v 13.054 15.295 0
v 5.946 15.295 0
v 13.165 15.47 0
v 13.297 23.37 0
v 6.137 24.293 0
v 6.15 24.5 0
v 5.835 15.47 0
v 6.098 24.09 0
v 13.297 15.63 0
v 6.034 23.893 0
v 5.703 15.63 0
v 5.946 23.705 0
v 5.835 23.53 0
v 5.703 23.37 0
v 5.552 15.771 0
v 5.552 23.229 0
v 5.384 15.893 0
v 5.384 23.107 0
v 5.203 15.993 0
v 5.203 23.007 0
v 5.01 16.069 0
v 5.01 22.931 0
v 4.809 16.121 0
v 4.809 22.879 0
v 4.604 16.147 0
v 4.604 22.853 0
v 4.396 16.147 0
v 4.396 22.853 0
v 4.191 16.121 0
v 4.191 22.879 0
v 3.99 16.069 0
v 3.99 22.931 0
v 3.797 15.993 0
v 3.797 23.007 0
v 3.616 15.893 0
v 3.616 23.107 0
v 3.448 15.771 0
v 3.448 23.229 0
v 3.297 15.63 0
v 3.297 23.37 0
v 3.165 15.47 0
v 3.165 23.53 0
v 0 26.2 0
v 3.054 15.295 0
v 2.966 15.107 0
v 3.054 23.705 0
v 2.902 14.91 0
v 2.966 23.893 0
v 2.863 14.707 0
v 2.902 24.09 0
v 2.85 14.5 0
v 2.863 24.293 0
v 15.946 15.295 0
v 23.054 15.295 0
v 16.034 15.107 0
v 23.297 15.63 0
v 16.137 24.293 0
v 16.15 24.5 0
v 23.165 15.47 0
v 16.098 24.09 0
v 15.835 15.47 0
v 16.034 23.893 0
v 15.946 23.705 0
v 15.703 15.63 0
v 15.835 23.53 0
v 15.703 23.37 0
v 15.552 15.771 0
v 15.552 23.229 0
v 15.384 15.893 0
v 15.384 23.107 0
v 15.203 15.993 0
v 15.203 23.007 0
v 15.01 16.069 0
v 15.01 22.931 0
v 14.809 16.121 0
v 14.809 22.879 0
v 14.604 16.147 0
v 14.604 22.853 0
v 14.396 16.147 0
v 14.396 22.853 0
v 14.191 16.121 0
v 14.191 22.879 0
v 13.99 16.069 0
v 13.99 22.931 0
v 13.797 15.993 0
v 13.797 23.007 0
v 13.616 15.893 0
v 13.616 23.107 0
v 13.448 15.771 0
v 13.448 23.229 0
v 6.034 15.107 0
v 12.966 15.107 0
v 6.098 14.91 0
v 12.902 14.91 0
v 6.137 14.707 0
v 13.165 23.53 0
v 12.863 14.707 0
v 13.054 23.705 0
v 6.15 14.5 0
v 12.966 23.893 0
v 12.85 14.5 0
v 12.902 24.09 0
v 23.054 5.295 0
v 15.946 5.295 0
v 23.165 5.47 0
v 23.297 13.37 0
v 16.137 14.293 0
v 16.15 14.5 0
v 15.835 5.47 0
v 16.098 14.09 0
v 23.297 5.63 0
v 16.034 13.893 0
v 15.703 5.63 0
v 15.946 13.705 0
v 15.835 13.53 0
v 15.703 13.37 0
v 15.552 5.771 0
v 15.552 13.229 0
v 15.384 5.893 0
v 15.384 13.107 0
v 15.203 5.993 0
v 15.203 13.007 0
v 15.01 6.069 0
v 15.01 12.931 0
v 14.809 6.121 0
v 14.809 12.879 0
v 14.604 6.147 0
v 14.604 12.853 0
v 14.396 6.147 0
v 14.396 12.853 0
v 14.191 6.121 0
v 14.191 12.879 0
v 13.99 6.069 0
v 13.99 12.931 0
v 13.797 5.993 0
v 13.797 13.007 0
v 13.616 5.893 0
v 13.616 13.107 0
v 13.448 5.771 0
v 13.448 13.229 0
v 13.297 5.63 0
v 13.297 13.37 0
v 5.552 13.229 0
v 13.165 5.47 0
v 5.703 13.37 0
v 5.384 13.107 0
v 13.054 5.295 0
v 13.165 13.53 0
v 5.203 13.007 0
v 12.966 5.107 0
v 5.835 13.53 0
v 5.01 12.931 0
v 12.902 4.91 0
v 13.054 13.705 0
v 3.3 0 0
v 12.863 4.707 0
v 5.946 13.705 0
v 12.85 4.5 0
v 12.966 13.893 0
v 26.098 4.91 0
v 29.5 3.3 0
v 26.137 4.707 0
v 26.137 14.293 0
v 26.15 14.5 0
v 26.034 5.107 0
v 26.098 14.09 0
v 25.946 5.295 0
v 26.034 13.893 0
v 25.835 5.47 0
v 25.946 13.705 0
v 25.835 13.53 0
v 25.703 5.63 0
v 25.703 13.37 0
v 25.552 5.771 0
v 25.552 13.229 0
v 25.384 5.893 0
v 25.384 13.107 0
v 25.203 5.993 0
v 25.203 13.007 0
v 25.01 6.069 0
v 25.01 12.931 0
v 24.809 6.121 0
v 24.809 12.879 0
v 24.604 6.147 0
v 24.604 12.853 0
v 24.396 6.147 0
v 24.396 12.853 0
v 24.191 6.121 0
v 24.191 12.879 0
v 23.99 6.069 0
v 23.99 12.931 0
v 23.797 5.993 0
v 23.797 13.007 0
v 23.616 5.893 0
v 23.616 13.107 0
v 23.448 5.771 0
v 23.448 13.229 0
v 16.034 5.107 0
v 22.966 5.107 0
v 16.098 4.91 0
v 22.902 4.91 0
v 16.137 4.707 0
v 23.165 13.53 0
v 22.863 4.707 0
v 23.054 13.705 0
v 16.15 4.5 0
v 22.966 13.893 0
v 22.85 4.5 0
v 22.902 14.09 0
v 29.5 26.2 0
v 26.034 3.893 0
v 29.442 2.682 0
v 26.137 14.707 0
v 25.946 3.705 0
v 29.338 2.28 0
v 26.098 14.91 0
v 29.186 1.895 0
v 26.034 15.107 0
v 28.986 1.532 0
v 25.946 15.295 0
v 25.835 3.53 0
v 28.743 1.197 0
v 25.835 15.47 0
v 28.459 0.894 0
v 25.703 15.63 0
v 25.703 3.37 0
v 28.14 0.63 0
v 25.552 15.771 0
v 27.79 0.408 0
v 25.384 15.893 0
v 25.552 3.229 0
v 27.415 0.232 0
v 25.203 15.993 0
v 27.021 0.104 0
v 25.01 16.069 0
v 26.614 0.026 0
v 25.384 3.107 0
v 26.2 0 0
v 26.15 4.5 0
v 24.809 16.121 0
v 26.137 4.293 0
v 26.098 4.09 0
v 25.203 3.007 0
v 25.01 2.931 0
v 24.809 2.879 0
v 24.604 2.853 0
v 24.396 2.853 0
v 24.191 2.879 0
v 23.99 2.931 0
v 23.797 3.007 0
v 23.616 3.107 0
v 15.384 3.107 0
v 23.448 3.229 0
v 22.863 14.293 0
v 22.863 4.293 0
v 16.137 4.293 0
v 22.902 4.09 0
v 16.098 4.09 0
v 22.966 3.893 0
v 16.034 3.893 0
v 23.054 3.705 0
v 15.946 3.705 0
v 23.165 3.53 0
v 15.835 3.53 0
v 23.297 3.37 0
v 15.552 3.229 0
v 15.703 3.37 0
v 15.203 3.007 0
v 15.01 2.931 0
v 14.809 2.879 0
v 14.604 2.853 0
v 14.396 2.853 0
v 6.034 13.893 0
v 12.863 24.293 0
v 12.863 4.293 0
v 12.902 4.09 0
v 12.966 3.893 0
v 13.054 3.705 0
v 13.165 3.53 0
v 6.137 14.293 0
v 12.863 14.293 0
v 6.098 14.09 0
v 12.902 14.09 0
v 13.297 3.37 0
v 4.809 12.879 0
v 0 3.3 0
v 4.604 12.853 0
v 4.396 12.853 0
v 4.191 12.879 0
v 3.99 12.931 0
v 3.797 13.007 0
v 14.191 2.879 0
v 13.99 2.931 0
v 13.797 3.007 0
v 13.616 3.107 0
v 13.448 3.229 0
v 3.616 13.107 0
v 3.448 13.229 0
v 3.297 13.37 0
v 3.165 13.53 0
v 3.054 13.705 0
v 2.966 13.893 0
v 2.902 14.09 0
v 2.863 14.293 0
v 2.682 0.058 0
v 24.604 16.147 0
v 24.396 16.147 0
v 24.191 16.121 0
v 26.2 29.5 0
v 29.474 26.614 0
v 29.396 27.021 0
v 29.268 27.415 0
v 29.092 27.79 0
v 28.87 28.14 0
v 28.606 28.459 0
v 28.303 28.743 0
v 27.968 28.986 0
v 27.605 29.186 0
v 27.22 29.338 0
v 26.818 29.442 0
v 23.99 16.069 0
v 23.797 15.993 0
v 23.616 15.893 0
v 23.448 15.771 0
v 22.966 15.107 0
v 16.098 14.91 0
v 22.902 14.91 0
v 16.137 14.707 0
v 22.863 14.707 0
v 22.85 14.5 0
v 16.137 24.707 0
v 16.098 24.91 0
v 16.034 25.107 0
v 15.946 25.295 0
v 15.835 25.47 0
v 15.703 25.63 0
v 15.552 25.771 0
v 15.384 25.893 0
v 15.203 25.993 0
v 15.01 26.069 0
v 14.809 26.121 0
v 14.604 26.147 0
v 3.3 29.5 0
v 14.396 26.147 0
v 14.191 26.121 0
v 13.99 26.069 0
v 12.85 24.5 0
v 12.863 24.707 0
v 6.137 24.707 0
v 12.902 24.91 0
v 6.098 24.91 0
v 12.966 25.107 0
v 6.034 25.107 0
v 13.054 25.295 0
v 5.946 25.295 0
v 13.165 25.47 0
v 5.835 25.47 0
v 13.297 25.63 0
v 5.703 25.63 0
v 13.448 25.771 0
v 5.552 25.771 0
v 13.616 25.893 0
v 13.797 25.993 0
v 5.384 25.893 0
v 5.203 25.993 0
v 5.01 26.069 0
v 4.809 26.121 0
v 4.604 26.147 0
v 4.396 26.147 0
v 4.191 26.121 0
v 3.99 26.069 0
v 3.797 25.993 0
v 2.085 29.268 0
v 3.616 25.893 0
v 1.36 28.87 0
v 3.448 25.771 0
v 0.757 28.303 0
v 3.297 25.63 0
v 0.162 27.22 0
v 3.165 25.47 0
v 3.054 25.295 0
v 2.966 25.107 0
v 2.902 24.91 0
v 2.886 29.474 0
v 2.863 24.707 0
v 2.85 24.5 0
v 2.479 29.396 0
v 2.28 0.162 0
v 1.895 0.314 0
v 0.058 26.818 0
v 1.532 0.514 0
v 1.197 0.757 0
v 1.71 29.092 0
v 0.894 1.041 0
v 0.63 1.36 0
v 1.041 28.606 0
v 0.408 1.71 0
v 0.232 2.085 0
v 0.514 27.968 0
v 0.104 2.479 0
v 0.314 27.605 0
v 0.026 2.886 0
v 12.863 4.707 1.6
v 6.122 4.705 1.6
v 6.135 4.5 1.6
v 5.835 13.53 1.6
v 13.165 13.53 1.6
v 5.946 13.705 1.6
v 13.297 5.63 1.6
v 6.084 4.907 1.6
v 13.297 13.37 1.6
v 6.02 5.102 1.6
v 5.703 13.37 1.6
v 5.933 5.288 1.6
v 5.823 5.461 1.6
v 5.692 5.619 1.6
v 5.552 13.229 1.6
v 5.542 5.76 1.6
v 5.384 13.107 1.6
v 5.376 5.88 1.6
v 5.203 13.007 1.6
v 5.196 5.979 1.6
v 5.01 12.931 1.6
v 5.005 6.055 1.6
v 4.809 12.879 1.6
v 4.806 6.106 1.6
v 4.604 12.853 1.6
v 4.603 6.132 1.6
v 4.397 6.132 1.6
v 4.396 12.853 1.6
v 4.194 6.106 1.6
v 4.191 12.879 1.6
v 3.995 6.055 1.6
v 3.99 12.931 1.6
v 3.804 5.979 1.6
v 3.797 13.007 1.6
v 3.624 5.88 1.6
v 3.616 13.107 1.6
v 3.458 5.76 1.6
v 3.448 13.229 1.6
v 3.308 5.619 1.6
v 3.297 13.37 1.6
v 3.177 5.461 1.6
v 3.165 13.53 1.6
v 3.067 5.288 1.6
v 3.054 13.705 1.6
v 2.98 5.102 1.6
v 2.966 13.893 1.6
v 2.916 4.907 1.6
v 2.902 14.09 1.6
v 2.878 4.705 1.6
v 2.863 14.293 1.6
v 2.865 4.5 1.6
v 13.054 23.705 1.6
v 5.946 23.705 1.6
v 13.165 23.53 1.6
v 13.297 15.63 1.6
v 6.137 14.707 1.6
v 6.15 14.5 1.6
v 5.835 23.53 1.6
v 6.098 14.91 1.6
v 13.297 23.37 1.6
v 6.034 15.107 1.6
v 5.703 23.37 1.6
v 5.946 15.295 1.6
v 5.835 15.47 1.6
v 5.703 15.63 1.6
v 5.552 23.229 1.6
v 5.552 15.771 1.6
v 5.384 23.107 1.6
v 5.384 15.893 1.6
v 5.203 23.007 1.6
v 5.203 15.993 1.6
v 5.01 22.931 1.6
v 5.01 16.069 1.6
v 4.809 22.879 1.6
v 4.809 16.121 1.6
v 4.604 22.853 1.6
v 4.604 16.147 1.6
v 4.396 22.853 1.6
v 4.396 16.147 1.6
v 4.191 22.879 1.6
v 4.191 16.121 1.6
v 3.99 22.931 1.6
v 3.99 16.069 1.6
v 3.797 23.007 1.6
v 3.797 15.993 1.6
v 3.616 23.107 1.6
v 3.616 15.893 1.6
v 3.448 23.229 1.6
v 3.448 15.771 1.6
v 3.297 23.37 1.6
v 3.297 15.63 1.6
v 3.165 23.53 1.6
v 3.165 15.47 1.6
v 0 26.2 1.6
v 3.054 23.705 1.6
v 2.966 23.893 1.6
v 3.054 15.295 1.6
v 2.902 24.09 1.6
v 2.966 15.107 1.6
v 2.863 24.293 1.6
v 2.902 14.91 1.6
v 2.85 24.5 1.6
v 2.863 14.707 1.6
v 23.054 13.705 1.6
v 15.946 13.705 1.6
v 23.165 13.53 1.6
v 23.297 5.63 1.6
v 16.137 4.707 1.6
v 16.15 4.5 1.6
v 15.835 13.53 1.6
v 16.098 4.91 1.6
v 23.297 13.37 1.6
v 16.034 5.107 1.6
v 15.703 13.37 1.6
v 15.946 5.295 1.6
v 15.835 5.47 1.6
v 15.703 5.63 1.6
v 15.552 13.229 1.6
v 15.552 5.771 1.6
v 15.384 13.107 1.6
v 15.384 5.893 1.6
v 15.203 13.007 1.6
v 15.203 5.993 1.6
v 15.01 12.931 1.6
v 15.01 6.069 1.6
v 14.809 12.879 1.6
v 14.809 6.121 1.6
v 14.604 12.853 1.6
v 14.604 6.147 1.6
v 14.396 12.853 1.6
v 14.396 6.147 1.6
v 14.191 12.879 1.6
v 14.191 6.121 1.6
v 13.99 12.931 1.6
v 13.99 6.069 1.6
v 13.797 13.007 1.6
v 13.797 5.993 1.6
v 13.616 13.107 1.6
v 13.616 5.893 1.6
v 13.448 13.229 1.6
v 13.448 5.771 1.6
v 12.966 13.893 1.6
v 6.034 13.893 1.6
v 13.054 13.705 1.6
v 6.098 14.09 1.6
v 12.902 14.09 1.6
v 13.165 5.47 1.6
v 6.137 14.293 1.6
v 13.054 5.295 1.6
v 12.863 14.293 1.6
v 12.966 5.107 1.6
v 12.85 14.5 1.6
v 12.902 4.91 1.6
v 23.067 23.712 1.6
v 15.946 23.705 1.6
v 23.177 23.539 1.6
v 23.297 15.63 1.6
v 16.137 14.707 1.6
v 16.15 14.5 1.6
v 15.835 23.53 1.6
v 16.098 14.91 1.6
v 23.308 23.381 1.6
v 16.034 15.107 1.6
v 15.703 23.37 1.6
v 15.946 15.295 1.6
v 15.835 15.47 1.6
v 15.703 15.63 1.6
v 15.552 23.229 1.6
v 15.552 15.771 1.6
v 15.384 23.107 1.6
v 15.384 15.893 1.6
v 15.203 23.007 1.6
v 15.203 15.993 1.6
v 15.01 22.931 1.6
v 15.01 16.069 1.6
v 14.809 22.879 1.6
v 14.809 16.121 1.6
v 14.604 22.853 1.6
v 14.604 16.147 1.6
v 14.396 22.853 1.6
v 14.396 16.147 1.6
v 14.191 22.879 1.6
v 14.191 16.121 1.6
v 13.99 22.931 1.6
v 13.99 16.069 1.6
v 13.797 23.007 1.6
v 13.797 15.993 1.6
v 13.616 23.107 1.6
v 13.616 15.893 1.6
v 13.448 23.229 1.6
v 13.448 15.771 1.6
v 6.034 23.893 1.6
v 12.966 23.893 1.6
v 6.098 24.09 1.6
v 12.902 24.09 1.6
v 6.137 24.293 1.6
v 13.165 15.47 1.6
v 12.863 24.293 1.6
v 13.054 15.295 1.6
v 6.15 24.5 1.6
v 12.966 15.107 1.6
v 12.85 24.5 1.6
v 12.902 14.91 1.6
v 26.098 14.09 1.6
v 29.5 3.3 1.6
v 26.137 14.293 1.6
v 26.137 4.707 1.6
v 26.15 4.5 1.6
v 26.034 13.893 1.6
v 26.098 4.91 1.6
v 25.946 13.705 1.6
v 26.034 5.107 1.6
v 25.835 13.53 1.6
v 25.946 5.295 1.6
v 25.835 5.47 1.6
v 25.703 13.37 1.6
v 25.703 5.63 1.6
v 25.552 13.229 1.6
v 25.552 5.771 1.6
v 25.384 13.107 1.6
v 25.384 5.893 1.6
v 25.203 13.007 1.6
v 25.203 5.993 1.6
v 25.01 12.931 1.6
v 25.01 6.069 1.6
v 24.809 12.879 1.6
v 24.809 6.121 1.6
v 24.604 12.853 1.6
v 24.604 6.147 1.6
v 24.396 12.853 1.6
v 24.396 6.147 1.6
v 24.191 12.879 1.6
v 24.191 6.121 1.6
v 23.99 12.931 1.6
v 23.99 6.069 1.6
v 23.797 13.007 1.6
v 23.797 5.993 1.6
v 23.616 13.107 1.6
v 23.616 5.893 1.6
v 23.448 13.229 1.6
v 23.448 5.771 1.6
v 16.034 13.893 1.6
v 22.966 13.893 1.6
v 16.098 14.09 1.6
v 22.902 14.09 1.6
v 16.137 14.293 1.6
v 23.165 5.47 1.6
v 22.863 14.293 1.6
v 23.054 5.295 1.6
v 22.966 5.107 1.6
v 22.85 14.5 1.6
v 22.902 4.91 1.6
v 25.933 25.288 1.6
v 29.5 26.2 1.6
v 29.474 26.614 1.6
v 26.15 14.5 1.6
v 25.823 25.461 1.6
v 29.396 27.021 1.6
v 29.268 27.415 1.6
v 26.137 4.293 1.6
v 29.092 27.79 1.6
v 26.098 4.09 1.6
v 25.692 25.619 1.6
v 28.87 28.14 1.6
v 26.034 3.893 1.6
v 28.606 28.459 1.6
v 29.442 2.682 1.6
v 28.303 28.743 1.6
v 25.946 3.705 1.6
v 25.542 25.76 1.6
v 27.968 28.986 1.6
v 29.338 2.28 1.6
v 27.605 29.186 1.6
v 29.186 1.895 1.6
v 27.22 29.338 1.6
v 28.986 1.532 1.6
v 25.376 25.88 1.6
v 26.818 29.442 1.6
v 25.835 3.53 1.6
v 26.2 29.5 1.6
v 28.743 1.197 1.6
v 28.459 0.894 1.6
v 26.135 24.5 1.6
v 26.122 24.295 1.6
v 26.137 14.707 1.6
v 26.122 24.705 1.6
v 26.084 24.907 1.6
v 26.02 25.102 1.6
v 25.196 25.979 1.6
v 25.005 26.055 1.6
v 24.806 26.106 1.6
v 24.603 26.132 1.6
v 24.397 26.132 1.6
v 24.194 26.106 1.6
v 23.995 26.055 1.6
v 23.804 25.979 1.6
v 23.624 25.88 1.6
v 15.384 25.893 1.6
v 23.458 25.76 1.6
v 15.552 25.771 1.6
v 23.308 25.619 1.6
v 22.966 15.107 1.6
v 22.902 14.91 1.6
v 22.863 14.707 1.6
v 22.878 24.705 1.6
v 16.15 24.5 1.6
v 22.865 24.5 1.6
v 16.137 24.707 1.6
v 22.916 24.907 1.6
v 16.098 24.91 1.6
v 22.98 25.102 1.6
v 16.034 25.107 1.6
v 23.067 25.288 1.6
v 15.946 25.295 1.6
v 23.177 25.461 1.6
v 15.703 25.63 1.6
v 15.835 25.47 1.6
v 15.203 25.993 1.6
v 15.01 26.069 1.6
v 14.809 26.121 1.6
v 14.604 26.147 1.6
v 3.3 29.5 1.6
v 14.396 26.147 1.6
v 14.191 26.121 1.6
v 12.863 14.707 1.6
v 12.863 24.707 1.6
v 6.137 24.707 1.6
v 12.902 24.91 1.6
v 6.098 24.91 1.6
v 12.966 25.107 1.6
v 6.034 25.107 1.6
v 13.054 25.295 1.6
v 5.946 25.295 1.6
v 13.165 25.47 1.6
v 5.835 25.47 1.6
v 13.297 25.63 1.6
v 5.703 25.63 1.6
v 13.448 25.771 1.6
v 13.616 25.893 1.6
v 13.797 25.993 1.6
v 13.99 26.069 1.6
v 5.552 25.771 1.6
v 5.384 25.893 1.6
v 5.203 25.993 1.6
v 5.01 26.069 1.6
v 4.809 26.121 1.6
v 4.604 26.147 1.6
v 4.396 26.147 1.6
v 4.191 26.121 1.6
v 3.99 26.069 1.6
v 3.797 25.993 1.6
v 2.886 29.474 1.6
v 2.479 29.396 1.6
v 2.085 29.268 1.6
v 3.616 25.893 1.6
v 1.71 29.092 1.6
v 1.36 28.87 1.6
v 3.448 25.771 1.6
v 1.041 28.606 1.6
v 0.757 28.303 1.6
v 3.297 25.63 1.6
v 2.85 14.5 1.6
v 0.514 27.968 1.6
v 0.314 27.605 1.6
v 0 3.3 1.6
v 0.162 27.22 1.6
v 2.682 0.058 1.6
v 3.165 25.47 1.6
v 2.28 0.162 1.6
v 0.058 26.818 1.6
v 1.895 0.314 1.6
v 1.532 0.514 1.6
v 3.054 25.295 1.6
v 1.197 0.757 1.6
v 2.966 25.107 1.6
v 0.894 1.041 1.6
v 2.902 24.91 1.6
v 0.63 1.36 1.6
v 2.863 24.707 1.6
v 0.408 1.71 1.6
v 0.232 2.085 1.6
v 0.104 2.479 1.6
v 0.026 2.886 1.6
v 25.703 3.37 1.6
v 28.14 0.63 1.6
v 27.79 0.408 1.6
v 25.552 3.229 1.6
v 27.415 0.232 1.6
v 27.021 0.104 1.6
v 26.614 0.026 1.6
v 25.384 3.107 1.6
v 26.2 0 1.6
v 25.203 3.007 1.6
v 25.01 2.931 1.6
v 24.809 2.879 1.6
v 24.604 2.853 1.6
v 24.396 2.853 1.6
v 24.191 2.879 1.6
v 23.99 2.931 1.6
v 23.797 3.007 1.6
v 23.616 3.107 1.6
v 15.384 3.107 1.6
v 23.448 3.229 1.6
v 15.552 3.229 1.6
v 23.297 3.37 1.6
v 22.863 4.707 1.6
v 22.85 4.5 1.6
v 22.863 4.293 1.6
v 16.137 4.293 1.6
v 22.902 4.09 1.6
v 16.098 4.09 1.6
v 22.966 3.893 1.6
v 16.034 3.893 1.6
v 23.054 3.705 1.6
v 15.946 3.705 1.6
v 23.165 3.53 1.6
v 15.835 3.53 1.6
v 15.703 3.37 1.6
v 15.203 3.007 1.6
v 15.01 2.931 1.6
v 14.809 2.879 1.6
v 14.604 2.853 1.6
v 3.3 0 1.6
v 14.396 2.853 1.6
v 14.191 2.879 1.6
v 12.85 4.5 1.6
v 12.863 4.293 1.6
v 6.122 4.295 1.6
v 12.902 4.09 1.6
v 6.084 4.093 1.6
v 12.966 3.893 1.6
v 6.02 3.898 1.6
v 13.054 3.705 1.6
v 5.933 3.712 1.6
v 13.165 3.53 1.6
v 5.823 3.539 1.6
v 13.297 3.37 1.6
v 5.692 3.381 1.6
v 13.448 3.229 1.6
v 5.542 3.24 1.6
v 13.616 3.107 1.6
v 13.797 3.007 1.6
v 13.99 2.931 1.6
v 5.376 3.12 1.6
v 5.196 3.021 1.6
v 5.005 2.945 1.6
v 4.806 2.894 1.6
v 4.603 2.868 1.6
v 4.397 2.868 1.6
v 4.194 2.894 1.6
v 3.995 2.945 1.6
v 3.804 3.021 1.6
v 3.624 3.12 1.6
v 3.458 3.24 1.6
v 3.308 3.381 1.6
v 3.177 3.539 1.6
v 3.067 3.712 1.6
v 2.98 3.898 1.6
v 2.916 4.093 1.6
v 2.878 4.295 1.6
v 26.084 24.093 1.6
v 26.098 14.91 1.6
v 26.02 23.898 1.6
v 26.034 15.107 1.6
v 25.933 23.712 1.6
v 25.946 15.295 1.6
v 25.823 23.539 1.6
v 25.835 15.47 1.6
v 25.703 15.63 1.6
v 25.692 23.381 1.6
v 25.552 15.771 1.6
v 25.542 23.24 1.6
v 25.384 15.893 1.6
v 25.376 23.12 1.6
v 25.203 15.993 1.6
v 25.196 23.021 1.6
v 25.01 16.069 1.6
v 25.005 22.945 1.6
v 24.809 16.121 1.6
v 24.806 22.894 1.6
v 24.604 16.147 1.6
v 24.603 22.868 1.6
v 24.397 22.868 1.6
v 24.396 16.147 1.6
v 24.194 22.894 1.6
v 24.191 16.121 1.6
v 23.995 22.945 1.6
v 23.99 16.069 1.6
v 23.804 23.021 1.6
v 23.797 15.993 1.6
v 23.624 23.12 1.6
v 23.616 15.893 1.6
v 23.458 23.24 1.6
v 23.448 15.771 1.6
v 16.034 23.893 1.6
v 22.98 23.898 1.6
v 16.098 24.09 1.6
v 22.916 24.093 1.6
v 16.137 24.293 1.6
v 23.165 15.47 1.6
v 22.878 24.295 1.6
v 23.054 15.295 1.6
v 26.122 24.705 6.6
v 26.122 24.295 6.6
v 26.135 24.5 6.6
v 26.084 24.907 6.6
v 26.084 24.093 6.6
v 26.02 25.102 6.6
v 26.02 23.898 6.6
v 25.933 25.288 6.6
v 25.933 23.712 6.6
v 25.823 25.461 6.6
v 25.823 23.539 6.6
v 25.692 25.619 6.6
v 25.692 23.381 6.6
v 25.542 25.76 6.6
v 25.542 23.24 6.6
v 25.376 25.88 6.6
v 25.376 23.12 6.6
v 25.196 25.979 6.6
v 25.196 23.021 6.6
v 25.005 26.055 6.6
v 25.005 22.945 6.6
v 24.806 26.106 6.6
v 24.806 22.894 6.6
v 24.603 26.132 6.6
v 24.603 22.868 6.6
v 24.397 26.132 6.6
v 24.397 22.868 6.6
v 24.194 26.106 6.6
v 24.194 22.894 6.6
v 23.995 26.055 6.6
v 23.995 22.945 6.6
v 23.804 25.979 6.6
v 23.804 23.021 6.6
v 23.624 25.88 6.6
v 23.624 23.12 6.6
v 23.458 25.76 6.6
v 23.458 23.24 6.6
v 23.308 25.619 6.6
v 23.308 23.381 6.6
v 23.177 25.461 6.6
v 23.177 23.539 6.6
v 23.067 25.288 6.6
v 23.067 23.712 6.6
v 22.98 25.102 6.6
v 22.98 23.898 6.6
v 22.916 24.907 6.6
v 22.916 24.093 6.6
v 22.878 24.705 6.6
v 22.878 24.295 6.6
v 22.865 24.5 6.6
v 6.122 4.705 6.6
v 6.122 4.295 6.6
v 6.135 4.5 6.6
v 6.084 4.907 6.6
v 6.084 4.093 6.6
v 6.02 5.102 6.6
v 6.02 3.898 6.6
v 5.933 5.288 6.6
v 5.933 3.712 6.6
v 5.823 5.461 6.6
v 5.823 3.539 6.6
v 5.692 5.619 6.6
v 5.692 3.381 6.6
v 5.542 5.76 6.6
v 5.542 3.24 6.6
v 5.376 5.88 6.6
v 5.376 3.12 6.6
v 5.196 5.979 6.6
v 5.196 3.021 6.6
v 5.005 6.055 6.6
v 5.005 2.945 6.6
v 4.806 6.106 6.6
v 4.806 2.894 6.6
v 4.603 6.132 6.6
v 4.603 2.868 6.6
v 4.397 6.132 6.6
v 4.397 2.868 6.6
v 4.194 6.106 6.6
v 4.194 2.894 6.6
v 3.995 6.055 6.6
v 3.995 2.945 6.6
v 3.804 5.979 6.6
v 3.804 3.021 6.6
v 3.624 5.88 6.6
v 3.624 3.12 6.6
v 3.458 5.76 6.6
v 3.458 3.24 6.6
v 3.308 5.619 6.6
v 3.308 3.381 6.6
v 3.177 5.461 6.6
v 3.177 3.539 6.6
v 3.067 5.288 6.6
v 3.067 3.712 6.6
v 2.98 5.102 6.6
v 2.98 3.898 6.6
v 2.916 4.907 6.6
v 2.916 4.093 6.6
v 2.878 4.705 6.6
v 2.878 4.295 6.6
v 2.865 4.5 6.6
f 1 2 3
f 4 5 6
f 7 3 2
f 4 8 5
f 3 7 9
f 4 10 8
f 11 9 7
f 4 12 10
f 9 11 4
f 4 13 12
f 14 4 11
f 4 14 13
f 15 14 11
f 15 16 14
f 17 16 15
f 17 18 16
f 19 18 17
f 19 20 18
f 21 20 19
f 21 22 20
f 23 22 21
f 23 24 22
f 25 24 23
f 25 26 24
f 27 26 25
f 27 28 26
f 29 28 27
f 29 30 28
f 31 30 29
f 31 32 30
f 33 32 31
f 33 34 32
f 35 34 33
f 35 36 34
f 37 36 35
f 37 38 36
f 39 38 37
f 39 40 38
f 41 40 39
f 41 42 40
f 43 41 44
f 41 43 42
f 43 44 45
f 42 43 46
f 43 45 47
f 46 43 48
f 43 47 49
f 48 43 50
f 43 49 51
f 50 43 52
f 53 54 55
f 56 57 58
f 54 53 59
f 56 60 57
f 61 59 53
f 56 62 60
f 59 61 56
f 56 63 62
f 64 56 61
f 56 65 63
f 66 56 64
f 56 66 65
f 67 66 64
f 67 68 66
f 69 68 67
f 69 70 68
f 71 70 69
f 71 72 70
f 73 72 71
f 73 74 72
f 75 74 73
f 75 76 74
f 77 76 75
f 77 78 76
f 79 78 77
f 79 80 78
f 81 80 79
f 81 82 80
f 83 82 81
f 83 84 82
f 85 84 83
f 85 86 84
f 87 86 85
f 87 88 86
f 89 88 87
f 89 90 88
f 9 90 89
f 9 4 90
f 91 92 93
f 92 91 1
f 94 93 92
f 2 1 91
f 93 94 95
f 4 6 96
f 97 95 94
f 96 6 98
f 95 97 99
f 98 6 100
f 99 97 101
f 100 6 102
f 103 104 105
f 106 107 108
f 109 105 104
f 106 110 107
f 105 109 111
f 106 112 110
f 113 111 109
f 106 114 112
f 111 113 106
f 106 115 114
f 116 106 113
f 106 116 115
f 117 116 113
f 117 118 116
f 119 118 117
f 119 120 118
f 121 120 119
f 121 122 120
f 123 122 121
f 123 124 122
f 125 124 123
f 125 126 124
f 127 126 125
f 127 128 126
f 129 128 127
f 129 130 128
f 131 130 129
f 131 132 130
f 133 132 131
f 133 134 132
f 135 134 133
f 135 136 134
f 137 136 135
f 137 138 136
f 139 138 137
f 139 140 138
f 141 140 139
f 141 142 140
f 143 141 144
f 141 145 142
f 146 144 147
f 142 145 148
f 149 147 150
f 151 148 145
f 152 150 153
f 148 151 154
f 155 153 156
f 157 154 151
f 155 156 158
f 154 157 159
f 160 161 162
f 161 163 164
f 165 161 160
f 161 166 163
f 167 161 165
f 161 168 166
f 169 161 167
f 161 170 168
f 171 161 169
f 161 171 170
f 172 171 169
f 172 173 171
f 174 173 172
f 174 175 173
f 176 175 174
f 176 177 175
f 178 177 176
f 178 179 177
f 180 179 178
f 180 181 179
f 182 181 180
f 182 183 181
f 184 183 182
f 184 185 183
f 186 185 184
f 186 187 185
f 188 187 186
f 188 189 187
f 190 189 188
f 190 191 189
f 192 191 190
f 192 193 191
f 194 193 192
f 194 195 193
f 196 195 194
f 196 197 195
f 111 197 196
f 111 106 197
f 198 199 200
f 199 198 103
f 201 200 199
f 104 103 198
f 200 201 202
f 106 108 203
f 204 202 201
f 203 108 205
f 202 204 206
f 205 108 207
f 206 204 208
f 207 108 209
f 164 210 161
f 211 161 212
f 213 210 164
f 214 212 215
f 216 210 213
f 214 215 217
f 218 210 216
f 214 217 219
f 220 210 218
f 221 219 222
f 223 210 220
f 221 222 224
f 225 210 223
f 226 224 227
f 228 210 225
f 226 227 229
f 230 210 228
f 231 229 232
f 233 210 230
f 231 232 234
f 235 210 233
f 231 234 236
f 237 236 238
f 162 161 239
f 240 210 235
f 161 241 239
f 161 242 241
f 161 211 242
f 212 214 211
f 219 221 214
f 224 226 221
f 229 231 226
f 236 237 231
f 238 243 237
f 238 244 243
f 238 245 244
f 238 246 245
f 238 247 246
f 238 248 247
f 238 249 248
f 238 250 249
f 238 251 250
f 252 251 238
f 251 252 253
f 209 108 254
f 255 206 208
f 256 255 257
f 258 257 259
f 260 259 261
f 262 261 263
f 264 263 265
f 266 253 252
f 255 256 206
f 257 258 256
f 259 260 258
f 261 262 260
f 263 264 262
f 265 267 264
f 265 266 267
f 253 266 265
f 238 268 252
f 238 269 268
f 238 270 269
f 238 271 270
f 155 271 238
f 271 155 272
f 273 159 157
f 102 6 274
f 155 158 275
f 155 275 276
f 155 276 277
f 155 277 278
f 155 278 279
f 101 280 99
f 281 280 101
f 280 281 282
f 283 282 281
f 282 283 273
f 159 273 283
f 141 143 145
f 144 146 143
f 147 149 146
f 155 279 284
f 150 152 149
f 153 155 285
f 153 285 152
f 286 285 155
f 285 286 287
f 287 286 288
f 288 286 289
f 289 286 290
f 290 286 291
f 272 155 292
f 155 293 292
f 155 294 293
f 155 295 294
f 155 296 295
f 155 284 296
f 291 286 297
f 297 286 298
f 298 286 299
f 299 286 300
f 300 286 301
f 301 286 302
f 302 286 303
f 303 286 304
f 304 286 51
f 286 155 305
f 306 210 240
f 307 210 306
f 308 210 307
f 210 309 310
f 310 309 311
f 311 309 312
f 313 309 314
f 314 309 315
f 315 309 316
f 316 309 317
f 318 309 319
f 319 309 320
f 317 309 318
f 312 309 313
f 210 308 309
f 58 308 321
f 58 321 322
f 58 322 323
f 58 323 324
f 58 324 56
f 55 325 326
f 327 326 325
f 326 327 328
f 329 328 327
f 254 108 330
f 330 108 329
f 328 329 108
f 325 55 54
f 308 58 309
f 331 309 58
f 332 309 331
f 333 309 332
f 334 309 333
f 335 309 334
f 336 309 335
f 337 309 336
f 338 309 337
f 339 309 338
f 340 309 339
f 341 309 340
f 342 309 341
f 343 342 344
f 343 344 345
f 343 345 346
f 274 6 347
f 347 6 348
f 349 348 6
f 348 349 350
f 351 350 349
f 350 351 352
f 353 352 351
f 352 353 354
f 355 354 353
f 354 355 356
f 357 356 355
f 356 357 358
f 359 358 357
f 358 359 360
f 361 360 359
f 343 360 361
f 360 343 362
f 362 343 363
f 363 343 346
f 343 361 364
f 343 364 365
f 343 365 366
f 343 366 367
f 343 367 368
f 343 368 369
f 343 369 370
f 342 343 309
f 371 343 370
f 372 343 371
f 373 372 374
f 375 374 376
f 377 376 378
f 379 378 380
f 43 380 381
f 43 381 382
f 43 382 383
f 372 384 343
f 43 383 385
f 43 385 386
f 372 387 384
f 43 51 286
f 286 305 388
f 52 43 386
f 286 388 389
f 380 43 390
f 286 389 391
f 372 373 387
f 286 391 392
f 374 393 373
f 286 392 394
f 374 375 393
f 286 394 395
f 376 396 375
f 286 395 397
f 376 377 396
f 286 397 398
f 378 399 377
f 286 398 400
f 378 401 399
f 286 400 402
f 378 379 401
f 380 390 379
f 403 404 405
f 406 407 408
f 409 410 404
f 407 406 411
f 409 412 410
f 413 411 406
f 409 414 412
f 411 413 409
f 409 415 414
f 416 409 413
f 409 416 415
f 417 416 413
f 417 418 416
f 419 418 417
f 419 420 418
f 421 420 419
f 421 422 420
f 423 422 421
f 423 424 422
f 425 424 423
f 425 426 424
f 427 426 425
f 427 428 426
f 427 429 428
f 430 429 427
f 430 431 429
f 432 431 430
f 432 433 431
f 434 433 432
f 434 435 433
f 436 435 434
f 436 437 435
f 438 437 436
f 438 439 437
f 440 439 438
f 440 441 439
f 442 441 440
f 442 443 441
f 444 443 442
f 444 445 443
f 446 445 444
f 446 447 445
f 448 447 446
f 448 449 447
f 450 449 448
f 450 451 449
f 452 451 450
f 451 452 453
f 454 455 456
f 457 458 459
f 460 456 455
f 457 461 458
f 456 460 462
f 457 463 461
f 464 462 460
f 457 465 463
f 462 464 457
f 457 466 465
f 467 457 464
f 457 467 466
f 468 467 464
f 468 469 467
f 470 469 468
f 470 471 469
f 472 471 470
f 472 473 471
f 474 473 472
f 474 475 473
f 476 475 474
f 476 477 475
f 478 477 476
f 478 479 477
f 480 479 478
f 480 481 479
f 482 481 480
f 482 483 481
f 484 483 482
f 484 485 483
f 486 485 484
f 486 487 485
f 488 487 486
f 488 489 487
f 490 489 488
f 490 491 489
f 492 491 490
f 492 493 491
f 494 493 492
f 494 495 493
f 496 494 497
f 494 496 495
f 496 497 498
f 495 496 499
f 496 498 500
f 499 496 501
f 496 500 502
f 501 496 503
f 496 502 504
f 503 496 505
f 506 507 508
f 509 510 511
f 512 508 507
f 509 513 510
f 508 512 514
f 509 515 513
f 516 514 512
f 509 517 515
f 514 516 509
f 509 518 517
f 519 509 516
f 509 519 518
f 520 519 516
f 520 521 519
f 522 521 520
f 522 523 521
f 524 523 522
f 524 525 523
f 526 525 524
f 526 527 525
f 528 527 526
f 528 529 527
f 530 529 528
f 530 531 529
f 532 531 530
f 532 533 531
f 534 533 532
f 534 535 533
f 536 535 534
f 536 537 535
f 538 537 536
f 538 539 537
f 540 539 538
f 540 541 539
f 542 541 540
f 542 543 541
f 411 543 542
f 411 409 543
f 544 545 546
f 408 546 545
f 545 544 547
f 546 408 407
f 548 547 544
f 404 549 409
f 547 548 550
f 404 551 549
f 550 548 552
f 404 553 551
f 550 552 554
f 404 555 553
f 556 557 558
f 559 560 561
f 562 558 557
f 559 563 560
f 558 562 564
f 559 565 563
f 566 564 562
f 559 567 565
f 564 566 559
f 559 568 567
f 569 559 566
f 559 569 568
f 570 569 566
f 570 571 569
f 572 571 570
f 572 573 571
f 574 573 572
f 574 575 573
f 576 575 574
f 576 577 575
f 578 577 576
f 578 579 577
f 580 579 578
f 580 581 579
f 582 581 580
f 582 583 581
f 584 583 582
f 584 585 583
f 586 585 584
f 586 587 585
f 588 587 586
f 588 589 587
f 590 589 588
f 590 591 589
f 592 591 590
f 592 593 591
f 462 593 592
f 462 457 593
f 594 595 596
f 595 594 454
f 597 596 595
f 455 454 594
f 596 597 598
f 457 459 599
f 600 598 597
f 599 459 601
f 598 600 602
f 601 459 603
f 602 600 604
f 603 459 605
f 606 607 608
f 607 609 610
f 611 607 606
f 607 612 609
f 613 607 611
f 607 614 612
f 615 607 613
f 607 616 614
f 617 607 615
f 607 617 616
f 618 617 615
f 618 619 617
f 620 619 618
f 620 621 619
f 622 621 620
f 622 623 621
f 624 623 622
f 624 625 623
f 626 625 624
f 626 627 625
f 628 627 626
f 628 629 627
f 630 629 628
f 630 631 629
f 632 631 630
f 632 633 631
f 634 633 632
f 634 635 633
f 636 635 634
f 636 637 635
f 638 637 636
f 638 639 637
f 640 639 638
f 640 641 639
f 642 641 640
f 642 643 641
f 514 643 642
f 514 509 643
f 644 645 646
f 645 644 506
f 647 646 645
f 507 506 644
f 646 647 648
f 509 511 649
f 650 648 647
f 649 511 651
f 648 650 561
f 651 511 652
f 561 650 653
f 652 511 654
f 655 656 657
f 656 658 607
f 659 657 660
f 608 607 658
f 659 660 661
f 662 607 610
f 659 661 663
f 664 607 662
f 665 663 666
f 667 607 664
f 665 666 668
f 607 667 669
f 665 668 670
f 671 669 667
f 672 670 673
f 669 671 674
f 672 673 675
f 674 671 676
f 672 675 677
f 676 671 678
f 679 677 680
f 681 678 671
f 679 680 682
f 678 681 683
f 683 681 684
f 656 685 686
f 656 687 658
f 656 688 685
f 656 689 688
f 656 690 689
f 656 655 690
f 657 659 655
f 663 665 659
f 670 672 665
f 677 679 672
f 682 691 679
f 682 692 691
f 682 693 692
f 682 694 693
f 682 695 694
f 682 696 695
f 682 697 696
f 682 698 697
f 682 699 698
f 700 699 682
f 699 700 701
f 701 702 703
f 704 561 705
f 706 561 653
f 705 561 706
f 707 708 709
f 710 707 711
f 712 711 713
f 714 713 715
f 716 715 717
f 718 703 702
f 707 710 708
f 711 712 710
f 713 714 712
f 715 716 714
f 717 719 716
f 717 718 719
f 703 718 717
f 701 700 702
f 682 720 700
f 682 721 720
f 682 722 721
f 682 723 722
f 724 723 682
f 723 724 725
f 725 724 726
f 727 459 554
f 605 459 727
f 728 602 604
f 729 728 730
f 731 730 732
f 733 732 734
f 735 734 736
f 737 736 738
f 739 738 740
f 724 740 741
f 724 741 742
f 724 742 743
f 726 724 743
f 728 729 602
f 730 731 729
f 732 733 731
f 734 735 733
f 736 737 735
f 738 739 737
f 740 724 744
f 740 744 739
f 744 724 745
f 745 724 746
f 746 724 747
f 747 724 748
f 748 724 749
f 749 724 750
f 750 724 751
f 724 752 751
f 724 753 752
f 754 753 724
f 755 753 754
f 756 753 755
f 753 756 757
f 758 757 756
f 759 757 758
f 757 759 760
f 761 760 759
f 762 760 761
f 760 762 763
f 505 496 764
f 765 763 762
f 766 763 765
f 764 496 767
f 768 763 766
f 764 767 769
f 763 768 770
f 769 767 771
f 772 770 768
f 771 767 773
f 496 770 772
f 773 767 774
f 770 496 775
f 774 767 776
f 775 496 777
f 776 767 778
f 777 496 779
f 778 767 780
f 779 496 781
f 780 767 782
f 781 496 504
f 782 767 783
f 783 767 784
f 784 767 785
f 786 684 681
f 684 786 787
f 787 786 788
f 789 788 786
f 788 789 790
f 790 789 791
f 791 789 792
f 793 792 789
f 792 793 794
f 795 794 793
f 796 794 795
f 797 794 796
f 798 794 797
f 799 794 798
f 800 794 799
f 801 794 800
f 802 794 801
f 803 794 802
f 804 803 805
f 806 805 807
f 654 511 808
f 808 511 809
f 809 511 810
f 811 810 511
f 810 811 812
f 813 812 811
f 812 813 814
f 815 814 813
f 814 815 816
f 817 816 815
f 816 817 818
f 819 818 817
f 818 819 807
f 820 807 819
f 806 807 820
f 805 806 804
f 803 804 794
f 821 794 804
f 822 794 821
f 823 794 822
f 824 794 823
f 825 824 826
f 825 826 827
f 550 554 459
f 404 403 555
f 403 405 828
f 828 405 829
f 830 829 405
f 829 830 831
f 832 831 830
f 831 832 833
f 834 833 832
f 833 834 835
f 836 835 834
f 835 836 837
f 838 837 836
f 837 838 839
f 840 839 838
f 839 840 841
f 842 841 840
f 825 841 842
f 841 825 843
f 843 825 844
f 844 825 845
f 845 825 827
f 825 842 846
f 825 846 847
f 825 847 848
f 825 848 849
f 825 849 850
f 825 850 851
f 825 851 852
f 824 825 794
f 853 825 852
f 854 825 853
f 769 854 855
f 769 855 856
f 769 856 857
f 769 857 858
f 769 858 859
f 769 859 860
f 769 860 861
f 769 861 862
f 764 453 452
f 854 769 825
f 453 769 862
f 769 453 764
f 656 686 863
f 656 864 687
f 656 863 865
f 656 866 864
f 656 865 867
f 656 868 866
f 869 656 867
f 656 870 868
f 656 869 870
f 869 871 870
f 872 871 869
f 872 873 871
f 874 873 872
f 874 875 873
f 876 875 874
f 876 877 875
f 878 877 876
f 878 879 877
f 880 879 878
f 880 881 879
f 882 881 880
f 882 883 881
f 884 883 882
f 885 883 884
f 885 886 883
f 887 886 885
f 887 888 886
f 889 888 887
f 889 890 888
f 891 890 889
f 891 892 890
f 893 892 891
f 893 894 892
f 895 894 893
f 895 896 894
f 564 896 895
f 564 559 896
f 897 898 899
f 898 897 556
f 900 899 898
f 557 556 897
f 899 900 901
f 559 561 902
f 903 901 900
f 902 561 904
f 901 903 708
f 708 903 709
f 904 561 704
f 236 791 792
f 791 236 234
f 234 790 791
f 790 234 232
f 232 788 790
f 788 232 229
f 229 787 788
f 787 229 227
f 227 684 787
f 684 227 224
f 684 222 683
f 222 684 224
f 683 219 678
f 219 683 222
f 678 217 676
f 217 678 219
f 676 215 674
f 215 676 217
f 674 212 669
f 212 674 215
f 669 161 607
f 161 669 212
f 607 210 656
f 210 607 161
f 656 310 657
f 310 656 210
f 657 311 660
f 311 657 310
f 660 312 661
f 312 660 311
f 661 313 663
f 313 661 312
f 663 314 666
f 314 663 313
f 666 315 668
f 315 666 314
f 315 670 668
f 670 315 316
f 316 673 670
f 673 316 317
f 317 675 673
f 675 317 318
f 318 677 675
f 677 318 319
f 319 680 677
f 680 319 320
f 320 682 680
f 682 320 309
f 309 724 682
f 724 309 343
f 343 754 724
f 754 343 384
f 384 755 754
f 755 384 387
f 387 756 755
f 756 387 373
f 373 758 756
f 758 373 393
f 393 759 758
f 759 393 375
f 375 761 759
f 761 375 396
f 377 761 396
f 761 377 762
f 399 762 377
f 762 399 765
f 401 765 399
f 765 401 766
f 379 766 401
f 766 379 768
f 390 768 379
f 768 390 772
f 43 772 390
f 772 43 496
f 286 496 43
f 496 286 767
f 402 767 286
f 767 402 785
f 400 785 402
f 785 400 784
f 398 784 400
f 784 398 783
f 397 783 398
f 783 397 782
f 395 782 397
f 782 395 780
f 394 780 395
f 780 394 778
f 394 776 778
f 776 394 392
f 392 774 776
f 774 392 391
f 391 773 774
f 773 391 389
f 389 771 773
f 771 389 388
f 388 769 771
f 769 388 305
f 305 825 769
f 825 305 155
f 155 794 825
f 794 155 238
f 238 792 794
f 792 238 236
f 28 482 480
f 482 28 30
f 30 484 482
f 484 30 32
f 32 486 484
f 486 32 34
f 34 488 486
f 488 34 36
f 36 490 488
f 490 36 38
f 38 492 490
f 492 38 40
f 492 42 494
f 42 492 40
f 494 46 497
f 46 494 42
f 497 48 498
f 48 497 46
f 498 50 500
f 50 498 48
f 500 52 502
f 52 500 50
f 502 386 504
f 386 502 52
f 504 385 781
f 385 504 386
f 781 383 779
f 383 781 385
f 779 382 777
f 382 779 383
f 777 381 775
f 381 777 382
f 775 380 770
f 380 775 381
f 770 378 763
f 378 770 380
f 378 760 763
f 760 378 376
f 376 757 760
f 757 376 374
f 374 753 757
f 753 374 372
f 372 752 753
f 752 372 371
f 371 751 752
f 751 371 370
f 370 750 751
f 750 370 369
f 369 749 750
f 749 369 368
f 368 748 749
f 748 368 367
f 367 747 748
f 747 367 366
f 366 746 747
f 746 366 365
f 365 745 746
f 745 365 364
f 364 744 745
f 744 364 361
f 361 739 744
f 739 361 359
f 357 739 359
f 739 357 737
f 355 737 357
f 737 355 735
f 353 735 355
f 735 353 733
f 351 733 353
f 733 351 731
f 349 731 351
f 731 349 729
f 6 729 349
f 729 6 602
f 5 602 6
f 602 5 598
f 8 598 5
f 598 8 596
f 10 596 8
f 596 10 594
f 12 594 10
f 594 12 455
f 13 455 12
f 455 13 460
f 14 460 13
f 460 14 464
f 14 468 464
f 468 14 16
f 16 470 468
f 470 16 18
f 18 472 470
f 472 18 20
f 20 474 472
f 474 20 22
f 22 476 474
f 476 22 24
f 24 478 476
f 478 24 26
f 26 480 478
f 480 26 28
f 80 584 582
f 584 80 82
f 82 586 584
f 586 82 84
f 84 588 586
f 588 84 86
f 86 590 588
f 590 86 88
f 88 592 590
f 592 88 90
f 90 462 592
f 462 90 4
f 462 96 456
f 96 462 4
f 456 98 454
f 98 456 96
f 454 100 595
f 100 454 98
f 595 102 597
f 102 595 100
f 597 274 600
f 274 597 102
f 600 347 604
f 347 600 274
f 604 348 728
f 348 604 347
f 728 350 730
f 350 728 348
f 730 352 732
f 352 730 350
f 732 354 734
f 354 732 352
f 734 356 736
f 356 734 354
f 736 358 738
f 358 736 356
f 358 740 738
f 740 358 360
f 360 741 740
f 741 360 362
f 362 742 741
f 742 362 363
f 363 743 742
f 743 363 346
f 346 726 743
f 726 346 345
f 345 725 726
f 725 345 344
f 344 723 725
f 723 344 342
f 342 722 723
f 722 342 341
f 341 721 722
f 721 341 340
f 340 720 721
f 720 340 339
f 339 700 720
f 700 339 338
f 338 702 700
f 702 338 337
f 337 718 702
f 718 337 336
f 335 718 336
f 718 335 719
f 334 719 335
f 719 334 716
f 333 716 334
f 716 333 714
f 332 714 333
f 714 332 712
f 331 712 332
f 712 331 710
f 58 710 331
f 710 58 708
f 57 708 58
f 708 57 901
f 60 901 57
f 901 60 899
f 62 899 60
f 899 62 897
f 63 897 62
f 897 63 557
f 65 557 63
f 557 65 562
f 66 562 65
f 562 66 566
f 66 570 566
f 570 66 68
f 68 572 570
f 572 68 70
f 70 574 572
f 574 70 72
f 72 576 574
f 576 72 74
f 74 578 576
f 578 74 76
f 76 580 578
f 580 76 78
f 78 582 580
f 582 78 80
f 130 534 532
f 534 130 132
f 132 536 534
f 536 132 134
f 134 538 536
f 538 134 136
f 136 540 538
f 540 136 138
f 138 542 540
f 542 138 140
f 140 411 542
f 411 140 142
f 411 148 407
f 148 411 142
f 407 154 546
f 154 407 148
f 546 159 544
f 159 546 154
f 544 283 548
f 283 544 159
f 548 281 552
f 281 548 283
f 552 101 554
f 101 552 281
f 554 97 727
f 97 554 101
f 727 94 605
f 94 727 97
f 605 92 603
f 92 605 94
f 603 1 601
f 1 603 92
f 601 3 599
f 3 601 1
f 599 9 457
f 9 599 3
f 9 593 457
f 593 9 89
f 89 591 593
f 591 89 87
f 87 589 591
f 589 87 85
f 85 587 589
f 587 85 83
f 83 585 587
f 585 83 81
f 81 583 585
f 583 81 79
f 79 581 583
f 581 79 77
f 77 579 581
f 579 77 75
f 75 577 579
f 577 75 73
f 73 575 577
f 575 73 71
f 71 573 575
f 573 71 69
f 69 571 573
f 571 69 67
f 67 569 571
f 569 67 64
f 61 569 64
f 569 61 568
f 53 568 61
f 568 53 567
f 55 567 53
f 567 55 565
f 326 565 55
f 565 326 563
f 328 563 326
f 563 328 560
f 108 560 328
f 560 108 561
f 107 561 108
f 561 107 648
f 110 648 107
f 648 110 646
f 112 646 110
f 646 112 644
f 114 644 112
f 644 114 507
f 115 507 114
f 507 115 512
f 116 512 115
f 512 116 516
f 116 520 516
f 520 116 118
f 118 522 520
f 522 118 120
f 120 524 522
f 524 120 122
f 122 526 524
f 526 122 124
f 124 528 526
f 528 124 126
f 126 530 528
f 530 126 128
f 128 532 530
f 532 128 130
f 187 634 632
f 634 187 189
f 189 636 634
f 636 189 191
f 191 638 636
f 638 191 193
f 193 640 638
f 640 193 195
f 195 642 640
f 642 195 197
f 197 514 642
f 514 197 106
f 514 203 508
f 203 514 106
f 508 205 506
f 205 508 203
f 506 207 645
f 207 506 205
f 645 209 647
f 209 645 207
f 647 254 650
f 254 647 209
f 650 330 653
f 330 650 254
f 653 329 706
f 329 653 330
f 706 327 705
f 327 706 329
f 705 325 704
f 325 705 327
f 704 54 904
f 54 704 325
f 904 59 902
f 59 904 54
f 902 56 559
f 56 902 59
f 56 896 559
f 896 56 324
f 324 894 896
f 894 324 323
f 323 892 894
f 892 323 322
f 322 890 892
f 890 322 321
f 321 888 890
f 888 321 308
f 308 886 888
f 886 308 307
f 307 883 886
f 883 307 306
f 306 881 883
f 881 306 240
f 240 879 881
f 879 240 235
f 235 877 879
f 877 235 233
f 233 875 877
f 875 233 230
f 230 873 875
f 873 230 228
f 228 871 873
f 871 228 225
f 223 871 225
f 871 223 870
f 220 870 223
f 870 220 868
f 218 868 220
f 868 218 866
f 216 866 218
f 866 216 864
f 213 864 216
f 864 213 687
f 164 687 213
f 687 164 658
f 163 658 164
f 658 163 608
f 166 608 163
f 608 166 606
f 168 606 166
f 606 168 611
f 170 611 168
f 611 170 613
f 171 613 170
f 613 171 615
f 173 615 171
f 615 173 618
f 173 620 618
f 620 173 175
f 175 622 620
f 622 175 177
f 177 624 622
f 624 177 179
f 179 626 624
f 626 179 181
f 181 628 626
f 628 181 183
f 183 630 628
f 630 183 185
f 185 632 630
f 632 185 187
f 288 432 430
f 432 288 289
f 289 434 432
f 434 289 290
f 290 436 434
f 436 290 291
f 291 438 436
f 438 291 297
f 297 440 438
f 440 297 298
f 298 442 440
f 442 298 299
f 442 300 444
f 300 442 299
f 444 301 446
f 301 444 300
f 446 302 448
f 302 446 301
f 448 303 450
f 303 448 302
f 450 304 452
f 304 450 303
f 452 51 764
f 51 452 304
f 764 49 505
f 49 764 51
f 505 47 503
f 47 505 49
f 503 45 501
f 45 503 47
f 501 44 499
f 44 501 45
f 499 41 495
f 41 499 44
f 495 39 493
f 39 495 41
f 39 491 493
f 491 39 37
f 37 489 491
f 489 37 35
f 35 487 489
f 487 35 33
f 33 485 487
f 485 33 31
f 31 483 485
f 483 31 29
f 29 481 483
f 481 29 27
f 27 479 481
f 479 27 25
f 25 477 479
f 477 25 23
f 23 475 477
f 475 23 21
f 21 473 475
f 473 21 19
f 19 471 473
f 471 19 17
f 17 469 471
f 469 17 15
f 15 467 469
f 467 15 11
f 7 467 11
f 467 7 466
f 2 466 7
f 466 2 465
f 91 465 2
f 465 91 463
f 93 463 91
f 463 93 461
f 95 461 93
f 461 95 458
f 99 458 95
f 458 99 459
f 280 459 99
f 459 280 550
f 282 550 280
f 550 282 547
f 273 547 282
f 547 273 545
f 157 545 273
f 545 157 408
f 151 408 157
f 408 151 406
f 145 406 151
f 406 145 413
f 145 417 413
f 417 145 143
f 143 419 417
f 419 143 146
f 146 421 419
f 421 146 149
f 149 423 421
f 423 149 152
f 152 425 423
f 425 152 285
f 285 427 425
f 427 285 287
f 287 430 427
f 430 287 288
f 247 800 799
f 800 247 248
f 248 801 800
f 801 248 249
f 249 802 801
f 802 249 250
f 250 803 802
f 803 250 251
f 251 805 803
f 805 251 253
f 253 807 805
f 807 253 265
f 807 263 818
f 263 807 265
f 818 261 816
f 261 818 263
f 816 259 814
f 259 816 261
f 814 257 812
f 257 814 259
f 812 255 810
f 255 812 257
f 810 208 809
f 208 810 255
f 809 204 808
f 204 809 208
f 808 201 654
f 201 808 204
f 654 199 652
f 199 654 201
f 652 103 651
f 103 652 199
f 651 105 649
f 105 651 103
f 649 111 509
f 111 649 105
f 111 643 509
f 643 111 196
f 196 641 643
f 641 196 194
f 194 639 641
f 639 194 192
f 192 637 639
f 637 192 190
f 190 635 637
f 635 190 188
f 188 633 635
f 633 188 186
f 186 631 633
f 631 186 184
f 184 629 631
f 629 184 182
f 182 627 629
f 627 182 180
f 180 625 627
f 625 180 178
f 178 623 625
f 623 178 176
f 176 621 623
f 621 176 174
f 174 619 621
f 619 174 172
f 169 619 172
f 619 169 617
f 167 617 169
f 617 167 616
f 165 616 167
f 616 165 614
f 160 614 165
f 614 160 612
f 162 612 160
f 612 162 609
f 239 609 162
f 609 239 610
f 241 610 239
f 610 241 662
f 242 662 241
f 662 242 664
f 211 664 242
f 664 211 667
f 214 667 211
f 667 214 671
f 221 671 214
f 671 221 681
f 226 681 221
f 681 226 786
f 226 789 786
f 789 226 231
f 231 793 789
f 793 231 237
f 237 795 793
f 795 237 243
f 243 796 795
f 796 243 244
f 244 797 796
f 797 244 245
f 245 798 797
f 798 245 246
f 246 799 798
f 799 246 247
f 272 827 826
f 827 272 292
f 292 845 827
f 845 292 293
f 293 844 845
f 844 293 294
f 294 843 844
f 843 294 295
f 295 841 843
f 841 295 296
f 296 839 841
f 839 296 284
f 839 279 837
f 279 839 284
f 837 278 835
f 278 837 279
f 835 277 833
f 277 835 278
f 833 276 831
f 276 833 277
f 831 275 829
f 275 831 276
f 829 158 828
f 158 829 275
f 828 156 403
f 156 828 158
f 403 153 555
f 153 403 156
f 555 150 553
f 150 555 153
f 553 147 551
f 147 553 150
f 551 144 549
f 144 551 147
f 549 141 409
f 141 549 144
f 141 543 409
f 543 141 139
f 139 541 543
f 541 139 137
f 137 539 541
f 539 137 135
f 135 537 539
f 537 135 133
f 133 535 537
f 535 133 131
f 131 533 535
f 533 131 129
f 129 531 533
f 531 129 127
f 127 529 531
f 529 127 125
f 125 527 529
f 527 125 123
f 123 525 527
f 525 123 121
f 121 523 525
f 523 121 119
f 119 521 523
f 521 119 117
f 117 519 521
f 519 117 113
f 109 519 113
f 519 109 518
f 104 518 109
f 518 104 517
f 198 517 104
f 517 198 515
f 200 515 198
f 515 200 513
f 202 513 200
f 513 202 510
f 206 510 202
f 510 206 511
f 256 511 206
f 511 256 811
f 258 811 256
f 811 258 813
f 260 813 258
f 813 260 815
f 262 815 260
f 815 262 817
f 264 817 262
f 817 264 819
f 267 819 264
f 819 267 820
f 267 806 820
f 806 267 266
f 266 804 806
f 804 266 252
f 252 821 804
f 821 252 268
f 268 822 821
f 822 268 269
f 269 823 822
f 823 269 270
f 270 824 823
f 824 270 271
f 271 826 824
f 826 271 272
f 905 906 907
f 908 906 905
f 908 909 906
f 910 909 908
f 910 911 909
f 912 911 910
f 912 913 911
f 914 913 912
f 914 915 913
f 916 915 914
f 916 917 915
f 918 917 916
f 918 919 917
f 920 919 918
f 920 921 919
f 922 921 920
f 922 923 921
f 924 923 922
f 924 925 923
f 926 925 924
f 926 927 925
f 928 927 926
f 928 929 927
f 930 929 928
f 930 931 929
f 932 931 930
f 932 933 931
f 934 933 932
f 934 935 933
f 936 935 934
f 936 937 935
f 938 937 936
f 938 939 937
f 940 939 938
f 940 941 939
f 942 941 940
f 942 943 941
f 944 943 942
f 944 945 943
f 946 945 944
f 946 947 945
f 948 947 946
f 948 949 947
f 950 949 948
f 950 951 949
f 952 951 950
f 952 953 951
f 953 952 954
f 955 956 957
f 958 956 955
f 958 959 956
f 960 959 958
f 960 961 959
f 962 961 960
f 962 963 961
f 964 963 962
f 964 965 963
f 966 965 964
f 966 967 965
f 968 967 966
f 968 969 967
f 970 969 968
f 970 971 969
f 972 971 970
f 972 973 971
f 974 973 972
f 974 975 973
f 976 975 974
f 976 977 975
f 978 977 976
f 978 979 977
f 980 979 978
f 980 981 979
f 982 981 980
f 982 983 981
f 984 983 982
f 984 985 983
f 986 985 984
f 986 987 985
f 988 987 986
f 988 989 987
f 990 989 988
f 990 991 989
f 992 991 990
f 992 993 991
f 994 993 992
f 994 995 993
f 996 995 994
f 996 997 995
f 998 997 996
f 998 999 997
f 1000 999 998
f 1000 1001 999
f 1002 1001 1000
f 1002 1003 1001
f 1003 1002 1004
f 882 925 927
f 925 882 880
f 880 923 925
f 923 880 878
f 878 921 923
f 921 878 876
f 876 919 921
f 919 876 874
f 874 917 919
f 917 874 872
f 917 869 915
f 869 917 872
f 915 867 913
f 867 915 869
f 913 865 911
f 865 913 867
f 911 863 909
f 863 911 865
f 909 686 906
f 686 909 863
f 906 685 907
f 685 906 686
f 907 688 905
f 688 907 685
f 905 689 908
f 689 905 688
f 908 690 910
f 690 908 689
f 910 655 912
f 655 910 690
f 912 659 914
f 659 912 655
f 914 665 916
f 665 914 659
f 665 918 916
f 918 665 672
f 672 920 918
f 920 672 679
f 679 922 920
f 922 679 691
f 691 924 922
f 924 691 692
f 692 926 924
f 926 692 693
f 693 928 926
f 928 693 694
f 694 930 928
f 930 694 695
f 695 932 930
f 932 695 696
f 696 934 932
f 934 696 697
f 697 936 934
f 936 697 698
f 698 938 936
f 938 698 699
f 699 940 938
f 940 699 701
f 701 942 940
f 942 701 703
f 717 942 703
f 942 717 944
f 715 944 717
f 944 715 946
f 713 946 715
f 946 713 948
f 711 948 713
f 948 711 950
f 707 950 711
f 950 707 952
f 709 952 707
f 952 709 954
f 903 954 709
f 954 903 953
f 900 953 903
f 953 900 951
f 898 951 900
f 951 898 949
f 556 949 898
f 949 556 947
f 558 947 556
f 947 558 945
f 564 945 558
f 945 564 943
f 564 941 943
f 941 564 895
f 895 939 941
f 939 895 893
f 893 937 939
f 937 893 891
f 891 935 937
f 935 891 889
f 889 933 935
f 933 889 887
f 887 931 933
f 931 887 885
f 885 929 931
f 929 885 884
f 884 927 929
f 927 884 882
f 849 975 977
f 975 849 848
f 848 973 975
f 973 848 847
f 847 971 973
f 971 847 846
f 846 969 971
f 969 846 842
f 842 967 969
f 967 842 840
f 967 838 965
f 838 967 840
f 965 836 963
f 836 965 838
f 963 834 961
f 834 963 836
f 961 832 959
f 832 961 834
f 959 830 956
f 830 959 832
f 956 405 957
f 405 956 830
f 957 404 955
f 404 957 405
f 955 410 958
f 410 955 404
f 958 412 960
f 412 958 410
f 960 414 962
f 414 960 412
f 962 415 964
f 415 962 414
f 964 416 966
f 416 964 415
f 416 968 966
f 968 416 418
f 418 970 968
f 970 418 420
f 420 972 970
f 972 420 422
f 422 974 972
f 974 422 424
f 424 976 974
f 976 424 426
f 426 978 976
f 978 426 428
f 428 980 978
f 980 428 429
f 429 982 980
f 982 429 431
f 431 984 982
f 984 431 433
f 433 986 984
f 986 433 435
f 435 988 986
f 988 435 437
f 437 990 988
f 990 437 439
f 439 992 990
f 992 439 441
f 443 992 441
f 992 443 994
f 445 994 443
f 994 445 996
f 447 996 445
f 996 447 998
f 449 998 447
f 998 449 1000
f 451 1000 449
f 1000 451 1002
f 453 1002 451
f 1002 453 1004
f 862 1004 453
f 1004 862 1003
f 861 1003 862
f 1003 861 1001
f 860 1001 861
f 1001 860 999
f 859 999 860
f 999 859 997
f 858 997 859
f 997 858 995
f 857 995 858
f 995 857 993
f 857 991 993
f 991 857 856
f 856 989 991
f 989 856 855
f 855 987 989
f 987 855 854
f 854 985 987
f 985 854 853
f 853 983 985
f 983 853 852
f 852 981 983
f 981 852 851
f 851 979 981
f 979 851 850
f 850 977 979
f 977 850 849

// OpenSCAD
// file: box.scad
include <config.scad>
include <common.scad>


module __box_outline(size) {
    size = size == undef ? box_size : size;
    __fillet(r=fillet_radius) {
         square([size.x, size.y]);
    }
}


module __bolt_holes_outline(d, size) {
    size = size == undef ? box_size : size;
    translate([screw_post_inset, screw_post_inset]) {
        circle(d = d);
    }
    translate([size.x - screw_post_inset, screw_post_inset]) {
        circle(d = d);
    }
    translate([size.x - screw_post_inset, size.y - screw_post_inset]) {
        circle(d = d);
    }
    translate([screw_post_inset, size.y - screw_post_inset]) {
        circle(d = d);
    }
}


module __vacuum_hole_outline() {
    spacing = vacuum_hole_diameter * 0.6;

    hull() {
        translate([-spacing, 0, 0]) {
            circle(d = vacuum_hole_diameter);
        }
        translate([spacing, 0, 0]) {
            circle(d = vacuum_hole_diameter);
        }
    }

    screw_spacing = spacing + vacuum_hole_diameter / 2 + bolt_head_clearance / 2 + 2;

    translate([screw_spacing, 0, 0]) {
        circle(d = bolt_diameter);
    }
    translate([-screw_spacing, 0, 0]) {
        circle(d = bolt_diameter);
    }
}

module __vacuum_hole() {
    translate([box_size.x / 2, 0, box_size.z / 2]) {
        rotate([90, 0, 0]) {
            linear_extrude(wall_thickness * 2 + 0.04, center=true) {
                __vacuum_hole_outline();
            }
        }
    }
}

module __vacuum_holes() {
    __vacuum_hole();
    translate([0, box_size.y]) __vacuum_hole();
    rotate([0, 0, 90]) __vacuum_hole();
    translate([box_size.x, 0]) rotate([0, 0, 90]) __vacuum_hole();
}

module box() {
    color("MediumPurple") {
        difference() {
            union() {
                difference() {
                    // Box
                    linear_extrude(box_size.z) {
                        __box_outline();
                    }
                    // Inner void
                    translate([0, 0, floor_thickness]) {
                        linear_extrude(box_size.z) {
                            offset(r = -wall_thickness) {
                                __box_outline();
                            }
                        }
                    }
                    // Vacuum holes
                    __vacuum_holes();
                }

                // Screw posts
                linear_extrude(box_size.z) {
                    __bolt_holes_outline(screw_post_diameter);
                }
            }

            // Screw holes
            translate([0, 0, -0.02]) {
                linear_extrude(box_size.z + 0.04) {
                    difference() {
                        __bolt_holes_outline(bolt_diameter);
                    }
                }
                linear_extrude(nut_height) {
                    difference() {
                        __bolt_holes_outline(nut_diameter);
                    }
                }
            }
        }
    }
}

box();
// file: lid.scad
include <config.scad>
include <common.scad>
use <box.scad>

module __lid_bolt_holes_outline(d, size, box_size) {
    box_count_x = size.x / box_size.x;
    /* Top and bottom holes */
    for(xn = [0:box_count_x]) {
        box_offset = [xn * box_size.x, 0];
        translate(box_offset + [screw_post_inset, screw_post_inset]) {
            circle(d = d);
        }
        translate(box_offset + [box_size.x - screw_post_inset, screw_post_inset]) {
            circle(d = d);
        }
        translate(box_offset + [box_size.x - screw_post_inset, size.y - screw_post_inset]) {
            circle(d = d);
        }
        translate(box_offset + [screw_post_inset, size.y - screw_post_inset]) {
            circle(d = d);
        }
    }
    /* Left and right holes */
    box_count_y = size.y / box_size.y;
    for(yn = [0:box_count_y]) {
        box_offset = [0, yn * box_size.y];
        translate(box_offset + [screw_post_inset, screw_post_inset]) {
            circle(d = d);
        }
        translate(box_offset + [screw_post_inset, box_size.y - screw_post_inset]) {
            circle(d = d);
        }
        translate(box_offset + [size.x - screw_post_inset, screw_post_inset]) {
            circle(d = d);
        }
        translate(box_offset + [size.x - screw_post_inset, box_size.y - screw_post_inset]) {
            circle(d = d);
        }
    }
}


module __lid_holes(size, border) {
    size = size == undef ? lid_size : size;
    border = border == undef ? lid_hole_border : border;

    for(xn = [0:lid_hole_spacing:size.x]) {
        if(xn > border && xn < size.x - border) {
            for(yn = [0:lid_hole_spacing:size.y]) {
                if(yn > border && yn < size.y - border) {
                    translate([xn, yn]) {
                        circle(d = lid_hole_diameter);
                    }
                }
            }
        }
    }
}

module __lid_outline() {
    difference() {
        __box_outline(lid_size);
        __lid_holes();
    }
}

module lid_2d() {
    difference() {
        __lid_outline();
        __lid_bolt_holes_outline(d=bolt_diameter, size=lid_size, box_size=box_size);
    }
}

module lid_3d() {
     color("Aqua") {
        linear_extrude(lid_thickness) {
            lid_2d();
        }
    }
}


lid_2d();
// file: common.scad
module __fillet(r) {
   offset(r = +r) {
     offset(delta = -r) {
       children();
     }
   }
}

module __chamfer_corners(r) {
    offset(r = +r) {
        offset(delta = -r) {
            children();
        }
    }
}

module __apply_border(size) {
    translate([size, size]) {
        offset(delta = size) {
            children();
        }
    }
}
// file: config.scad
$fn = 50;

pcb_size = [130, 118, 1.6];
stencil_size = [220, 210];

box_size = [80, 80, 20];
lid_size = [240, 240];
fillet_radius = 10;
wall_thickness = 2;
floor_thickness = 1.5;
bolt_diameter = 3;
bolt_head_clearance = 7;
bolt_head_height = 2.7;
nut_diameter = 7;
nut_height = 4;
lid_thickness = 4;
lid_hole_spacing = 10;
lid_hole_diameter = 3.3;
lid_hole_border = 10;
magnet_size = [6.1, 2.1];
lift_hole_diameter = 20;
vacuum_hole_diameter = 12;
guide_hole_diameter = 4;
guide_peg_length = 15;

screw_post_diameter = bolt_head_clearance + 2;
screw_post_inset = 6.3;
// main file
include <config.scad>
include <common.scad>
use <lid.scad>


module __riser_pegs_outline(pos, size, d) {
    translate(pos + [lid_hole_spacing / 2, lid_hole_spacing / 2]){
        circle(d = d);
    }
    translate(pos + size - [lid_hole_spacing / 2, lid_hole_spacing / 2]){
        circle(d = d);
    }
}

module riser() {
    size = [lid_hole_spacing * 3, lid_hole_spacing * 3];
    pos = [lid_hole_border + lid_hole_spacing / 2, lid_hole_border + lid_hole_spacing / 2];
    margin = [0.5, 0.5];

    color("HotPink") {
        translate(-(pos + margin)) {
            linear_extrude(pcb_size.z) {
                difference() {
                    translate(pos + margin) {
                        __fillet(lid_hole_diameter) {
                            square(size - margin);
                        }
                    }
                    __lid_holes();
                }
            }
            linear_extrude(lid_thickness + pcb_size.z + 1) {
                __riser_pegs_outline(pos=pos, size=size, d=lid_hole_diameter - 0.03);
            }
            linear_extrude(pcb_size.z) {
                __riser_pegs_outline(pos=pos, size=size, d=lid_hole_diameter + 0.03);
            }
        }
    }
}

riser();
